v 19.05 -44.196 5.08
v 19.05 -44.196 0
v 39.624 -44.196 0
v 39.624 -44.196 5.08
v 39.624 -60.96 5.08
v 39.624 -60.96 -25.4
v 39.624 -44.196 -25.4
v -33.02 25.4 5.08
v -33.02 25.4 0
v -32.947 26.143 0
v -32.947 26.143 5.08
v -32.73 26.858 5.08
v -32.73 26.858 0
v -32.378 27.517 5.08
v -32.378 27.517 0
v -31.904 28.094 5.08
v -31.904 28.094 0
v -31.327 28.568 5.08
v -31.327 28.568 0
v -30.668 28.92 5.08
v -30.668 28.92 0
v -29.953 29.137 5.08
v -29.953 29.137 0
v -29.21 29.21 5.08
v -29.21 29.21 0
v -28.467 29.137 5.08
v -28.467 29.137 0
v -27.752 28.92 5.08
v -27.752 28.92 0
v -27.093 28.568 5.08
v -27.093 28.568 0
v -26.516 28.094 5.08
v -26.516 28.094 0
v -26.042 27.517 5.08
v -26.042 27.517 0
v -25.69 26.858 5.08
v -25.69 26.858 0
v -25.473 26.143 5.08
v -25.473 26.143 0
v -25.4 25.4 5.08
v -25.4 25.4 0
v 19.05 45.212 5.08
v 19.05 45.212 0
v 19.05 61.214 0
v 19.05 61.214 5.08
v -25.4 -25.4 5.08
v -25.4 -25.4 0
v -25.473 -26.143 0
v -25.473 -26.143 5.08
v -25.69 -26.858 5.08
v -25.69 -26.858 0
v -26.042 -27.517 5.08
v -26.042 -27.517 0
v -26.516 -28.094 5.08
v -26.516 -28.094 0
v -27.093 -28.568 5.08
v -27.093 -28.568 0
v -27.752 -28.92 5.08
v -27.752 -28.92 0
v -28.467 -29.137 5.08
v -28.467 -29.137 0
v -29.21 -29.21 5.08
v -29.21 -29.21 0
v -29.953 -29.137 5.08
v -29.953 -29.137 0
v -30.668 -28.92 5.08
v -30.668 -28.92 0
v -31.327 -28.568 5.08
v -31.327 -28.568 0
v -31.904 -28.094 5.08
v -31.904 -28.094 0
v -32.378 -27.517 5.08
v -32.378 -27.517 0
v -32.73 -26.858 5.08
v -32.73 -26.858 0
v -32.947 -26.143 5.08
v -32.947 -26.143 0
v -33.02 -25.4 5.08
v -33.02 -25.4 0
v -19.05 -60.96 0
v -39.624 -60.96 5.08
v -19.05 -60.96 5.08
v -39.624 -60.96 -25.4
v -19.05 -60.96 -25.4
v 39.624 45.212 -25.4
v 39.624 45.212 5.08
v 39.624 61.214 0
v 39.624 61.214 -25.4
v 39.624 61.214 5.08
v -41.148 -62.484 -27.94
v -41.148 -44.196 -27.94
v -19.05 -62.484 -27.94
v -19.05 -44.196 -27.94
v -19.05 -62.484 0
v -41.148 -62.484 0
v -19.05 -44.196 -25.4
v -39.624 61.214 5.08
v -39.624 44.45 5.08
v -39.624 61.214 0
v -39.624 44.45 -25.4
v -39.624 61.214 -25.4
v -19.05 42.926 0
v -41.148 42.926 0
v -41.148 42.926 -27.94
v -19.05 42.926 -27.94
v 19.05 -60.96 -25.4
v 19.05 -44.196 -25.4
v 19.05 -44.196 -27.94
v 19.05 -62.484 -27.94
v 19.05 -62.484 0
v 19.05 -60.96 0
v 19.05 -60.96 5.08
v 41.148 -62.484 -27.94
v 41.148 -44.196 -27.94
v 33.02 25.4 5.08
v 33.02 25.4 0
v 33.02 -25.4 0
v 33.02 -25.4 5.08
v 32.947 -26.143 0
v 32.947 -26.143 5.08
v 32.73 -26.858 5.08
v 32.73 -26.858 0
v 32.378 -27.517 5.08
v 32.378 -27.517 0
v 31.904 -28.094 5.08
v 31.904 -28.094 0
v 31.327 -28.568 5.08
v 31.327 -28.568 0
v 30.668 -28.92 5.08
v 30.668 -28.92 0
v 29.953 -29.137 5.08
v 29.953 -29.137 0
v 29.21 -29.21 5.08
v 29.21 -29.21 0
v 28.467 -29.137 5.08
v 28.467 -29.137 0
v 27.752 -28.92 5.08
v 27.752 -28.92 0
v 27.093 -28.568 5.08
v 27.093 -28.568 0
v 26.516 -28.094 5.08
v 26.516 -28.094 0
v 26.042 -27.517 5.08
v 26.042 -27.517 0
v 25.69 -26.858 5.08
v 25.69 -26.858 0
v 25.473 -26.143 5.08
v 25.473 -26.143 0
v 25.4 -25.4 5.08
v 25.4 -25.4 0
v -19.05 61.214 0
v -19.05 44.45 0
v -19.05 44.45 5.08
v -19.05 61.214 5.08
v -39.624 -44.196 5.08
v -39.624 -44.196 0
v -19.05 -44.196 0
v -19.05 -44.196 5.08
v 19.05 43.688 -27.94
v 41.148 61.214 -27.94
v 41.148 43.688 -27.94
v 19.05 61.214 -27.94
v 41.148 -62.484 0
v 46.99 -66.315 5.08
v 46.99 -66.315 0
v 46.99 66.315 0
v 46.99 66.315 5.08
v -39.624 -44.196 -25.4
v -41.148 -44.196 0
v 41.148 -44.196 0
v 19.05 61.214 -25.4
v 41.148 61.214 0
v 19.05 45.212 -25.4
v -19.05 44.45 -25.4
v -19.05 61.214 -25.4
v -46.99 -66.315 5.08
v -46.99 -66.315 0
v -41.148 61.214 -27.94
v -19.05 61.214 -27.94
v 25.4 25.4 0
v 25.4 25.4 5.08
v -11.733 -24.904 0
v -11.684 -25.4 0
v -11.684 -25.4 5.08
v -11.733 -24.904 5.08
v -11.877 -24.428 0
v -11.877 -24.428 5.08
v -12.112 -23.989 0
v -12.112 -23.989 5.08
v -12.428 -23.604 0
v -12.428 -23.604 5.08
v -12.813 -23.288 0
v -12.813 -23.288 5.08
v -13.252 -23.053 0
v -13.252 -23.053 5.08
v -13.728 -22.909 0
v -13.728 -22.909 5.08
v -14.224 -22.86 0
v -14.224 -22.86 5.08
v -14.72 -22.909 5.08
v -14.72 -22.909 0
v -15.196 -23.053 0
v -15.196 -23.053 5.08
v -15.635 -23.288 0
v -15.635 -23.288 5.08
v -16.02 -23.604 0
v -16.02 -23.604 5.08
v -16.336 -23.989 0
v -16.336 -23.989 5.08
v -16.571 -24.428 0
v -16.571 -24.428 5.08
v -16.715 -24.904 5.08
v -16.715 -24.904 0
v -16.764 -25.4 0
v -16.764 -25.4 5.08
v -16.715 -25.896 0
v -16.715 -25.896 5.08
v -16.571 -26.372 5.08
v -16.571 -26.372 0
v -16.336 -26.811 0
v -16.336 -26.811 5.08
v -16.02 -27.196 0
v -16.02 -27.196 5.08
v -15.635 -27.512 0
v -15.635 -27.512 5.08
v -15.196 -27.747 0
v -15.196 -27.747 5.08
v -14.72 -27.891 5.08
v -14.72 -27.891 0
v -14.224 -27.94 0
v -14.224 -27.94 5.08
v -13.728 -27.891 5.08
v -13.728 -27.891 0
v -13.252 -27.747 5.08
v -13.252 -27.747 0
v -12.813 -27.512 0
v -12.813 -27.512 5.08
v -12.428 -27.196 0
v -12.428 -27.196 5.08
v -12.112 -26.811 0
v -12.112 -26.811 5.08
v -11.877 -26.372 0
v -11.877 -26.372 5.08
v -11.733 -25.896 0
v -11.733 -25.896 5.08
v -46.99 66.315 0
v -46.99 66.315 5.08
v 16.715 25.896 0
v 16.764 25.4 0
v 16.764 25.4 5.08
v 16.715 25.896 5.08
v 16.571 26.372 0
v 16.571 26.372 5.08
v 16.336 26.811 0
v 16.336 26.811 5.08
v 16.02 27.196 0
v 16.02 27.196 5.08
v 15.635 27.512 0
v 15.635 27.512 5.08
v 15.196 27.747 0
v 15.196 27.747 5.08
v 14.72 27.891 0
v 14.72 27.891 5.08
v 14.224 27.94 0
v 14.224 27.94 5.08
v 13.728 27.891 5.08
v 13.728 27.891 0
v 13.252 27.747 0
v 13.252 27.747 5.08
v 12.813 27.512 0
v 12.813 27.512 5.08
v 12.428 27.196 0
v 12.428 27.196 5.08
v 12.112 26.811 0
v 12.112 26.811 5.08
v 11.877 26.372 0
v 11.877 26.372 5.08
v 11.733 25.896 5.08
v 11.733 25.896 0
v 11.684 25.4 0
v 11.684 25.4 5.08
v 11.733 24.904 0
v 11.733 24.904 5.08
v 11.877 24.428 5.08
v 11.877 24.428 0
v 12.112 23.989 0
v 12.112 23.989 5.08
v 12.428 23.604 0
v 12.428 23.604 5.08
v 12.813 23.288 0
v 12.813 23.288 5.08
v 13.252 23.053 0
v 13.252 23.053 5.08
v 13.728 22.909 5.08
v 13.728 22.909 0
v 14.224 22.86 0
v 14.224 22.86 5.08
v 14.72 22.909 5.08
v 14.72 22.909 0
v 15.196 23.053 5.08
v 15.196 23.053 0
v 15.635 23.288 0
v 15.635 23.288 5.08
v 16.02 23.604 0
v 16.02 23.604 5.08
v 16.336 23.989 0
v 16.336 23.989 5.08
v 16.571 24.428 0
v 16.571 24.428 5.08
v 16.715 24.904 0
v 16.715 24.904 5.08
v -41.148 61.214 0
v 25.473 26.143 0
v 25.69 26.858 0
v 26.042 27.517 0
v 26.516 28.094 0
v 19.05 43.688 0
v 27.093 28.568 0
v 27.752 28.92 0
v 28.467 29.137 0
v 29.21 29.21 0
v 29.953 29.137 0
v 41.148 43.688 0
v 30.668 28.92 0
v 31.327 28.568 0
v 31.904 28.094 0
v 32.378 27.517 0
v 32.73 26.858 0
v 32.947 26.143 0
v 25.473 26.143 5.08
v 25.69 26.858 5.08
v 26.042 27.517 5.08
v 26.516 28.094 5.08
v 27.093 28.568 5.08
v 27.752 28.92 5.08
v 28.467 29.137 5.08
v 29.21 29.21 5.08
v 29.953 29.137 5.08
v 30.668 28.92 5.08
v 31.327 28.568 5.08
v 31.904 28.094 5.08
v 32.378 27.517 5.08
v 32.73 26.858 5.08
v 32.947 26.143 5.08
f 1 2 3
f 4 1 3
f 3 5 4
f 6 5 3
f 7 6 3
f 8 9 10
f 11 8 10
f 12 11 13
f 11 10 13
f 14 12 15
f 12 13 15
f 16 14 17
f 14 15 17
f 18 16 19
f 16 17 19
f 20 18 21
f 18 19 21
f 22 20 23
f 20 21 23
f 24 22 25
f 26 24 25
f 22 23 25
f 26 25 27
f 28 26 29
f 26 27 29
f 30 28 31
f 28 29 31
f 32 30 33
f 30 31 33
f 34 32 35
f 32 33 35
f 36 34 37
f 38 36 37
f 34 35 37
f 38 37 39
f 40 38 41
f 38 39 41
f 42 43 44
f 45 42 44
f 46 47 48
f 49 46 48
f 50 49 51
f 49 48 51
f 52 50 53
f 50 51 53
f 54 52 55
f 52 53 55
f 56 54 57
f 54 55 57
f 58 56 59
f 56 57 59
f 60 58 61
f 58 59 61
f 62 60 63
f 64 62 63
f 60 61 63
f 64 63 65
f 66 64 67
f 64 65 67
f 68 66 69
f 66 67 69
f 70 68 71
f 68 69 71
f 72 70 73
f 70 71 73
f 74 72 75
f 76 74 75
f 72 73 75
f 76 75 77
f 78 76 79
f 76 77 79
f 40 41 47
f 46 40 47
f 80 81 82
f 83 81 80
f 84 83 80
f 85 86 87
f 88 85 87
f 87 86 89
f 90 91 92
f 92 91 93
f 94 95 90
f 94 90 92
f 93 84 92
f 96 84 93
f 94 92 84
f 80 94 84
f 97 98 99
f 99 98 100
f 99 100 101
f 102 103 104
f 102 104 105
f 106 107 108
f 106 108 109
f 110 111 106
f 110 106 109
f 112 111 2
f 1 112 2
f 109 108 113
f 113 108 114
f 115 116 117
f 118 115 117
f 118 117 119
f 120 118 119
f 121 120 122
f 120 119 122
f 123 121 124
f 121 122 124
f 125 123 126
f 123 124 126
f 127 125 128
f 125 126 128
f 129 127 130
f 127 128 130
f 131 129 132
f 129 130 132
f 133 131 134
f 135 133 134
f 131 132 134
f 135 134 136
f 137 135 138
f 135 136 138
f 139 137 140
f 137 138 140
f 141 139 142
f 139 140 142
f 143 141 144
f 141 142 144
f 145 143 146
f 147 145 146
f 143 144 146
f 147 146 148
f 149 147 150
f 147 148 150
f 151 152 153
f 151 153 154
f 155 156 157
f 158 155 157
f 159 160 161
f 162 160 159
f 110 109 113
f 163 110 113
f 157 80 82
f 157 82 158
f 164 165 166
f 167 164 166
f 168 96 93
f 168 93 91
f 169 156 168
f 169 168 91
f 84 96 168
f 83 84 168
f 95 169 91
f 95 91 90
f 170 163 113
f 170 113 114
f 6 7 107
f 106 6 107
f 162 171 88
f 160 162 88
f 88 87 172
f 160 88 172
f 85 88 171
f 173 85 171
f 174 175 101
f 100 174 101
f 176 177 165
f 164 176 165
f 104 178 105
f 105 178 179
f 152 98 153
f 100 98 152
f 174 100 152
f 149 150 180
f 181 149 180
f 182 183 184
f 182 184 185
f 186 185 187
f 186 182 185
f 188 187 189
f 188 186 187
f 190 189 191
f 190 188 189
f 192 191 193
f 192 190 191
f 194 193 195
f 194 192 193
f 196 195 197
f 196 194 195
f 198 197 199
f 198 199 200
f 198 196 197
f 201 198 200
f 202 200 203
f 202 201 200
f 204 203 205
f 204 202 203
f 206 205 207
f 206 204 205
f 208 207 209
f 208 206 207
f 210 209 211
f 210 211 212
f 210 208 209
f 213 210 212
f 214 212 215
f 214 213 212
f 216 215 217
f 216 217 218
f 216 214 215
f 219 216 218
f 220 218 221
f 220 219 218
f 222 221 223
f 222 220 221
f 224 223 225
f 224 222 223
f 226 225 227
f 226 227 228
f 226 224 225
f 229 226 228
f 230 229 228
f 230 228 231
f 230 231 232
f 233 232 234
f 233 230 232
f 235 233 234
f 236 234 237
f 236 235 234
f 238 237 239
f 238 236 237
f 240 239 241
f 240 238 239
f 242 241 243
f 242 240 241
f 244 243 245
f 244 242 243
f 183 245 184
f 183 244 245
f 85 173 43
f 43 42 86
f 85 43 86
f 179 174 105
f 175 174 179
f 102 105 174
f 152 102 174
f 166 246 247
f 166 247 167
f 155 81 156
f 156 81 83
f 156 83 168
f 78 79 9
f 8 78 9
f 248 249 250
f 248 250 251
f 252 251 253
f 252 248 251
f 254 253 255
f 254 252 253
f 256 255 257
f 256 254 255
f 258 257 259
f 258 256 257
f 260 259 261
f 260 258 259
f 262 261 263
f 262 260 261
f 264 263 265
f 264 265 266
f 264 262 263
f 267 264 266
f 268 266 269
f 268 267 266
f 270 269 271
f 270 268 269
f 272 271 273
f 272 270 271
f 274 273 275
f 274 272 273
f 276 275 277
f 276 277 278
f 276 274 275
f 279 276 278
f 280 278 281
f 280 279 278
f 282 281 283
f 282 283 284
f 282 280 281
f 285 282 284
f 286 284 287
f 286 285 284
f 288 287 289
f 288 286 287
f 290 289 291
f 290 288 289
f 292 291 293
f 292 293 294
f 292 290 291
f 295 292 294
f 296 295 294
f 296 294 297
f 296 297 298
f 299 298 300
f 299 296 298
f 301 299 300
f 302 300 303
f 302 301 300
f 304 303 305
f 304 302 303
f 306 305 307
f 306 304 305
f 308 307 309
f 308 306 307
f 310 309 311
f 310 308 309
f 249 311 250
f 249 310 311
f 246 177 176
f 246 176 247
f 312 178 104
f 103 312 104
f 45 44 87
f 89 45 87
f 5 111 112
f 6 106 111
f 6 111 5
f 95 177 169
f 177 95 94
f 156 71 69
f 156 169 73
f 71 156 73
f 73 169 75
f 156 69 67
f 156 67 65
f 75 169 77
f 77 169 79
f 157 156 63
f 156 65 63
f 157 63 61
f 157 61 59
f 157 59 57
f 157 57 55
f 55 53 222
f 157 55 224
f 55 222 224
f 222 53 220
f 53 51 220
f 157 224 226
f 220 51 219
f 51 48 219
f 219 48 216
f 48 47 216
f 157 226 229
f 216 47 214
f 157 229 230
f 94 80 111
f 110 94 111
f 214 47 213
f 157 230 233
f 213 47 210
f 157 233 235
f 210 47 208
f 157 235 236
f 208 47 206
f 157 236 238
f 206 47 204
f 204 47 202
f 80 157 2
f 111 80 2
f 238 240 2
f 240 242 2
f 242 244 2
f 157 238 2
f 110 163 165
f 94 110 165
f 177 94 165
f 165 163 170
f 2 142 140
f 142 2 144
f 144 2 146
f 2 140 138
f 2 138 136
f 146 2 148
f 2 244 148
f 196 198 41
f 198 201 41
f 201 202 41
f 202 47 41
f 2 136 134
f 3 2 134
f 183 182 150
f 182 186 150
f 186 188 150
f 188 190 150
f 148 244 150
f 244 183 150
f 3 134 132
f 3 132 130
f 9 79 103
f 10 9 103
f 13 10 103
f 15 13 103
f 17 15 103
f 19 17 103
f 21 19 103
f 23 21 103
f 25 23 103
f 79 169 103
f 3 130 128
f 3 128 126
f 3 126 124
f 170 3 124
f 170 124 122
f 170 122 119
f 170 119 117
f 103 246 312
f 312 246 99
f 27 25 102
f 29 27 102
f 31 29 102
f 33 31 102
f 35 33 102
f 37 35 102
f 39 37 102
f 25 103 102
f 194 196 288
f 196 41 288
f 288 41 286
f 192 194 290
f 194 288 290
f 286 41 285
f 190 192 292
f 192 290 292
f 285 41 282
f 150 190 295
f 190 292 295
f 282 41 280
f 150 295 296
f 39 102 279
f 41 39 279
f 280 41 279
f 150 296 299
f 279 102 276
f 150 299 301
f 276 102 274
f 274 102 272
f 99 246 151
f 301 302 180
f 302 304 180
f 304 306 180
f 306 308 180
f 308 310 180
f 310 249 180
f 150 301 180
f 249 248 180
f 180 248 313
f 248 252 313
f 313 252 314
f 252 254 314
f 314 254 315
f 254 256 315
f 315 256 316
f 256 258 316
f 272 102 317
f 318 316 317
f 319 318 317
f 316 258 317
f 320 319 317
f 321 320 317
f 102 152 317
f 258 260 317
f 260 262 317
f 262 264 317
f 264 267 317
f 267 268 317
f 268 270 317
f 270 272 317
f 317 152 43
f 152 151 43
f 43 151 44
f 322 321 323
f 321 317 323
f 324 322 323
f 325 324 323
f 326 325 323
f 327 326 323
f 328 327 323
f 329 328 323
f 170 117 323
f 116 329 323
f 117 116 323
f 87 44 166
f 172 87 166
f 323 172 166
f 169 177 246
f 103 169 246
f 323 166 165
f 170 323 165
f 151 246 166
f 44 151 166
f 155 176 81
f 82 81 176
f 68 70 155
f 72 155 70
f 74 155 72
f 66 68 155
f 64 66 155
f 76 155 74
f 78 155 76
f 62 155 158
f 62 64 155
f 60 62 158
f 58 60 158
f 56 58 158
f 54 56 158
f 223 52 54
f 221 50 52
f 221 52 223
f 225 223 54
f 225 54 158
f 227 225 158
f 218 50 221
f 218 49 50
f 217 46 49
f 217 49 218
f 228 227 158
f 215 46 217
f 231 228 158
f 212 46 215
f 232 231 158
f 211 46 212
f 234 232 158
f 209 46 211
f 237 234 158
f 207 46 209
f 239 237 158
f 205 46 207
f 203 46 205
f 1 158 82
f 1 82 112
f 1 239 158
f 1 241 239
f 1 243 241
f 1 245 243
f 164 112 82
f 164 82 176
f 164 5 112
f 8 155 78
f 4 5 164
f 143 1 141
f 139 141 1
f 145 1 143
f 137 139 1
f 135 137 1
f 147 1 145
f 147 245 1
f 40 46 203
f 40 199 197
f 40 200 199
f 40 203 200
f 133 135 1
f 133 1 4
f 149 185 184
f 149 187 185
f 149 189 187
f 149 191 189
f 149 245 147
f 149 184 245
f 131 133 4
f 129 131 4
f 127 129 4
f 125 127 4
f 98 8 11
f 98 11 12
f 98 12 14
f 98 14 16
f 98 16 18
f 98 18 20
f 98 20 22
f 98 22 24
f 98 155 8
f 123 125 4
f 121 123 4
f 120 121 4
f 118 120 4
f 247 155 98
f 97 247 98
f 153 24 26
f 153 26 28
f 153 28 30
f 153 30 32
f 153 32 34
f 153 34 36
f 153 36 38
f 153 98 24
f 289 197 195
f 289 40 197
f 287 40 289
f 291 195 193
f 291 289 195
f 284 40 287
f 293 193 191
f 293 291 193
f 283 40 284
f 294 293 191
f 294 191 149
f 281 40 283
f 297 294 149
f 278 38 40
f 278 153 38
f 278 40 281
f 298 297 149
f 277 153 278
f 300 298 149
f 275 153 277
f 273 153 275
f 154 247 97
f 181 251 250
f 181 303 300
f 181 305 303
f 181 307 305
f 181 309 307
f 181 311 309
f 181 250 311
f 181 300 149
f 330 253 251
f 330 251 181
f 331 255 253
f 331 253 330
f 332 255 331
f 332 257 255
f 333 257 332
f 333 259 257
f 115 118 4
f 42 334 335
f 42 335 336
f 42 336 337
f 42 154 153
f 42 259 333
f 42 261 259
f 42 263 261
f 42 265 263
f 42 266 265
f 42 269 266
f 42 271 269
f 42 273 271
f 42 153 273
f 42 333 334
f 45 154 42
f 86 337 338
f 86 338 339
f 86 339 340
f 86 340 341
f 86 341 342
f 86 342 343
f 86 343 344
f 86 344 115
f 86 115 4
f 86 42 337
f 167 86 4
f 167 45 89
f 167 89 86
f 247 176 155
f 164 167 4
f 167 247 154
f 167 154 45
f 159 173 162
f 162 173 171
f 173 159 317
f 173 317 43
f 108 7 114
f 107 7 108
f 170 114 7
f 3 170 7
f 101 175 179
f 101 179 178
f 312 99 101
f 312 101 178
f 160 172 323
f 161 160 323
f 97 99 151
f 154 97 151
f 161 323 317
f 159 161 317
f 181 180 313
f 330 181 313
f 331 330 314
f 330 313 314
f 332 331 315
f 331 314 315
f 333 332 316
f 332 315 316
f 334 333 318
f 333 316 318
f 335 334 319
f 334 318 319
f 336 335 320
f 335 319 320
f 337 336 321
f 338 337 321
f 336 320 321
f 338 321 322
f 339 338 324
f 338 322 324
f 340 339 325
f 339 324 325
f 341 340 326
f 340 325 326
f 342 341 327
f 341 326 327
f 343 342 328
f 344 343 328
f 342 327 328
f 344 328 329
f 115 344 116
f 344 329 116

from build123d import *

# Parameters (mm, degrees)
SKETCH1_W           = 93.98
SKETCH1_H           = 132.62918919
SKETCH1_R           = 2.54
SKETCH1_W_2         = 20.574
SKETCH1_H_2         = 16.002
SKETCH1_H_3         = 16.764
BOSS_EXTRUDE1_DEPTH = 5.08
BOSS_EXTRUDE2_DEPTH = 27.94
SKETCH4_W           = 22.098
SKETCH4_H           = 17.526
SKETCH4_H_2         = 18.288
BOSS_EXTRUDE3_DEPTH = 2.54


with BuildPart() as part:
    # Sketch1 → Boss-Extrude1 (new body)
    with BuildSketch(Plane.XY):
        Rectangle(SKETCH1_W, SKETCH1_H)
        with Locations((-14.224, -25.4)):
            Circle(SKETCH1_R, mode=Mode.SUBTRACT)
        with Locations((14.224, 25.4)):
            Circle(SKETCH1_R, mode=Mode.SUBTRACT)
        with Locations((29.337, 53.213)):
            Rectangle(SKETCH1_W_2, SKETCH1_H_2, mode=Mode.SUBTRACT)
        with Locations((-29.337, -52.578)):
            Rectangle(SKETCH1_W_2, SKETCH1_H_3, mode=Mode.SUBTRACT)
        with Locations((-29.337, 52.832)):
            Rectangle(SKETCH1_W_2, SKETCH1_H_3, mode=Mode.SUBTRACT)
        with Locations((29.337, -52.578)):
            Rectangle(SKETCH1_W_2, SKETCH1_H_3, mode=Mode.SUBTRACT)
        with BuildLine():
            Line((-33.02, -25.4), (-33.02, 25.4))
            ThreePointArc((-33.02, 25.4), (-29.21, 29.21), (-25.4, 25.4))
            Line((-25.4, 25.4), (-25.4, -25.4))
            ThreePointArc((-25.4, -25.4), (-29.21, -29.21), (-33.02, -25.4))
        make_face(mode=Mode.SUBTRACT)
        with BuildLine():
            Line((25.4, -25.4), (25.4, 25.4))
            ThreePointArc((25.4, 25.4), (29.21, 29.21), (33.02, 25.4))
            Line((33.02, 25.4), (33.02, -25.4))
            ThreePointArc((33.02, -25.4), (29.21, -29.21), (25.4, -25.4))
        make_face(mode=Mode.SUBTRACT)
    extrude(amount=BOSS_EXTRUDE1_DEPTH)

    # Sketch3 → Boss-Extrude2 (add)
    with BuildSketch(Plane(origin=(0, 0, 0), x_dir=(-1, 0, 0), z_dir=(0, 0, -1))):
        Polygon((-19.05, 45.212), (-39.624, 45.212), (-39.624, 61.214), (-41.148, 61.214), (-41.148, 43.688), (-19.05, 43.688), align=None)
        Polygon((19.05, 44.45), (39.624, 44.45), (39.624, 61.214), (41.148, 61.214), (41.148, 42.926), (19.05, 42.926), align=None)
        Polygon((19.05, -60.96), (39.624, -60.96), (39.624, -44.196), (41.148, -44.196), (41.148, -62.484), (19.05, -62.484), align=None)
        Polygon((-39.624, -44.196), (-39.624, -60.96), (-19.05, -60.96), (-19.05, -62.484), (-41.148, -62.484), (-41.148, -44.196), align=None)
    extrude(amount=BOSS_EXTRUDE2_DEPTH)

    # Sketch4 → Boss-Extrude3 (add)
    with BuildSketch(Plane(origin=(0, 0, -27.94), x_dir=(-1, 0, 0), z_dir=(0, 0, -1))):
        with Locations((-30.099, 52.451)):
            Rectangle(SKETCH4_W, SKETCH4_H)
        with Locations((30.099, 52.07)):
            Rectangle(SKETCH4_W, SKETCH4_H_2)
        with Locations((30.099, -53.34)):
            Rectangle(SKETCH4_W, SKETCH4_H_2)
        with Locations((-30.099, -53.34)):
            Rectangle(SKETCH4_W, SKETCH4_H_2)
    extrude(amount=-BOSS_EXTRUDE3_DEPTH)


solid = part.part
